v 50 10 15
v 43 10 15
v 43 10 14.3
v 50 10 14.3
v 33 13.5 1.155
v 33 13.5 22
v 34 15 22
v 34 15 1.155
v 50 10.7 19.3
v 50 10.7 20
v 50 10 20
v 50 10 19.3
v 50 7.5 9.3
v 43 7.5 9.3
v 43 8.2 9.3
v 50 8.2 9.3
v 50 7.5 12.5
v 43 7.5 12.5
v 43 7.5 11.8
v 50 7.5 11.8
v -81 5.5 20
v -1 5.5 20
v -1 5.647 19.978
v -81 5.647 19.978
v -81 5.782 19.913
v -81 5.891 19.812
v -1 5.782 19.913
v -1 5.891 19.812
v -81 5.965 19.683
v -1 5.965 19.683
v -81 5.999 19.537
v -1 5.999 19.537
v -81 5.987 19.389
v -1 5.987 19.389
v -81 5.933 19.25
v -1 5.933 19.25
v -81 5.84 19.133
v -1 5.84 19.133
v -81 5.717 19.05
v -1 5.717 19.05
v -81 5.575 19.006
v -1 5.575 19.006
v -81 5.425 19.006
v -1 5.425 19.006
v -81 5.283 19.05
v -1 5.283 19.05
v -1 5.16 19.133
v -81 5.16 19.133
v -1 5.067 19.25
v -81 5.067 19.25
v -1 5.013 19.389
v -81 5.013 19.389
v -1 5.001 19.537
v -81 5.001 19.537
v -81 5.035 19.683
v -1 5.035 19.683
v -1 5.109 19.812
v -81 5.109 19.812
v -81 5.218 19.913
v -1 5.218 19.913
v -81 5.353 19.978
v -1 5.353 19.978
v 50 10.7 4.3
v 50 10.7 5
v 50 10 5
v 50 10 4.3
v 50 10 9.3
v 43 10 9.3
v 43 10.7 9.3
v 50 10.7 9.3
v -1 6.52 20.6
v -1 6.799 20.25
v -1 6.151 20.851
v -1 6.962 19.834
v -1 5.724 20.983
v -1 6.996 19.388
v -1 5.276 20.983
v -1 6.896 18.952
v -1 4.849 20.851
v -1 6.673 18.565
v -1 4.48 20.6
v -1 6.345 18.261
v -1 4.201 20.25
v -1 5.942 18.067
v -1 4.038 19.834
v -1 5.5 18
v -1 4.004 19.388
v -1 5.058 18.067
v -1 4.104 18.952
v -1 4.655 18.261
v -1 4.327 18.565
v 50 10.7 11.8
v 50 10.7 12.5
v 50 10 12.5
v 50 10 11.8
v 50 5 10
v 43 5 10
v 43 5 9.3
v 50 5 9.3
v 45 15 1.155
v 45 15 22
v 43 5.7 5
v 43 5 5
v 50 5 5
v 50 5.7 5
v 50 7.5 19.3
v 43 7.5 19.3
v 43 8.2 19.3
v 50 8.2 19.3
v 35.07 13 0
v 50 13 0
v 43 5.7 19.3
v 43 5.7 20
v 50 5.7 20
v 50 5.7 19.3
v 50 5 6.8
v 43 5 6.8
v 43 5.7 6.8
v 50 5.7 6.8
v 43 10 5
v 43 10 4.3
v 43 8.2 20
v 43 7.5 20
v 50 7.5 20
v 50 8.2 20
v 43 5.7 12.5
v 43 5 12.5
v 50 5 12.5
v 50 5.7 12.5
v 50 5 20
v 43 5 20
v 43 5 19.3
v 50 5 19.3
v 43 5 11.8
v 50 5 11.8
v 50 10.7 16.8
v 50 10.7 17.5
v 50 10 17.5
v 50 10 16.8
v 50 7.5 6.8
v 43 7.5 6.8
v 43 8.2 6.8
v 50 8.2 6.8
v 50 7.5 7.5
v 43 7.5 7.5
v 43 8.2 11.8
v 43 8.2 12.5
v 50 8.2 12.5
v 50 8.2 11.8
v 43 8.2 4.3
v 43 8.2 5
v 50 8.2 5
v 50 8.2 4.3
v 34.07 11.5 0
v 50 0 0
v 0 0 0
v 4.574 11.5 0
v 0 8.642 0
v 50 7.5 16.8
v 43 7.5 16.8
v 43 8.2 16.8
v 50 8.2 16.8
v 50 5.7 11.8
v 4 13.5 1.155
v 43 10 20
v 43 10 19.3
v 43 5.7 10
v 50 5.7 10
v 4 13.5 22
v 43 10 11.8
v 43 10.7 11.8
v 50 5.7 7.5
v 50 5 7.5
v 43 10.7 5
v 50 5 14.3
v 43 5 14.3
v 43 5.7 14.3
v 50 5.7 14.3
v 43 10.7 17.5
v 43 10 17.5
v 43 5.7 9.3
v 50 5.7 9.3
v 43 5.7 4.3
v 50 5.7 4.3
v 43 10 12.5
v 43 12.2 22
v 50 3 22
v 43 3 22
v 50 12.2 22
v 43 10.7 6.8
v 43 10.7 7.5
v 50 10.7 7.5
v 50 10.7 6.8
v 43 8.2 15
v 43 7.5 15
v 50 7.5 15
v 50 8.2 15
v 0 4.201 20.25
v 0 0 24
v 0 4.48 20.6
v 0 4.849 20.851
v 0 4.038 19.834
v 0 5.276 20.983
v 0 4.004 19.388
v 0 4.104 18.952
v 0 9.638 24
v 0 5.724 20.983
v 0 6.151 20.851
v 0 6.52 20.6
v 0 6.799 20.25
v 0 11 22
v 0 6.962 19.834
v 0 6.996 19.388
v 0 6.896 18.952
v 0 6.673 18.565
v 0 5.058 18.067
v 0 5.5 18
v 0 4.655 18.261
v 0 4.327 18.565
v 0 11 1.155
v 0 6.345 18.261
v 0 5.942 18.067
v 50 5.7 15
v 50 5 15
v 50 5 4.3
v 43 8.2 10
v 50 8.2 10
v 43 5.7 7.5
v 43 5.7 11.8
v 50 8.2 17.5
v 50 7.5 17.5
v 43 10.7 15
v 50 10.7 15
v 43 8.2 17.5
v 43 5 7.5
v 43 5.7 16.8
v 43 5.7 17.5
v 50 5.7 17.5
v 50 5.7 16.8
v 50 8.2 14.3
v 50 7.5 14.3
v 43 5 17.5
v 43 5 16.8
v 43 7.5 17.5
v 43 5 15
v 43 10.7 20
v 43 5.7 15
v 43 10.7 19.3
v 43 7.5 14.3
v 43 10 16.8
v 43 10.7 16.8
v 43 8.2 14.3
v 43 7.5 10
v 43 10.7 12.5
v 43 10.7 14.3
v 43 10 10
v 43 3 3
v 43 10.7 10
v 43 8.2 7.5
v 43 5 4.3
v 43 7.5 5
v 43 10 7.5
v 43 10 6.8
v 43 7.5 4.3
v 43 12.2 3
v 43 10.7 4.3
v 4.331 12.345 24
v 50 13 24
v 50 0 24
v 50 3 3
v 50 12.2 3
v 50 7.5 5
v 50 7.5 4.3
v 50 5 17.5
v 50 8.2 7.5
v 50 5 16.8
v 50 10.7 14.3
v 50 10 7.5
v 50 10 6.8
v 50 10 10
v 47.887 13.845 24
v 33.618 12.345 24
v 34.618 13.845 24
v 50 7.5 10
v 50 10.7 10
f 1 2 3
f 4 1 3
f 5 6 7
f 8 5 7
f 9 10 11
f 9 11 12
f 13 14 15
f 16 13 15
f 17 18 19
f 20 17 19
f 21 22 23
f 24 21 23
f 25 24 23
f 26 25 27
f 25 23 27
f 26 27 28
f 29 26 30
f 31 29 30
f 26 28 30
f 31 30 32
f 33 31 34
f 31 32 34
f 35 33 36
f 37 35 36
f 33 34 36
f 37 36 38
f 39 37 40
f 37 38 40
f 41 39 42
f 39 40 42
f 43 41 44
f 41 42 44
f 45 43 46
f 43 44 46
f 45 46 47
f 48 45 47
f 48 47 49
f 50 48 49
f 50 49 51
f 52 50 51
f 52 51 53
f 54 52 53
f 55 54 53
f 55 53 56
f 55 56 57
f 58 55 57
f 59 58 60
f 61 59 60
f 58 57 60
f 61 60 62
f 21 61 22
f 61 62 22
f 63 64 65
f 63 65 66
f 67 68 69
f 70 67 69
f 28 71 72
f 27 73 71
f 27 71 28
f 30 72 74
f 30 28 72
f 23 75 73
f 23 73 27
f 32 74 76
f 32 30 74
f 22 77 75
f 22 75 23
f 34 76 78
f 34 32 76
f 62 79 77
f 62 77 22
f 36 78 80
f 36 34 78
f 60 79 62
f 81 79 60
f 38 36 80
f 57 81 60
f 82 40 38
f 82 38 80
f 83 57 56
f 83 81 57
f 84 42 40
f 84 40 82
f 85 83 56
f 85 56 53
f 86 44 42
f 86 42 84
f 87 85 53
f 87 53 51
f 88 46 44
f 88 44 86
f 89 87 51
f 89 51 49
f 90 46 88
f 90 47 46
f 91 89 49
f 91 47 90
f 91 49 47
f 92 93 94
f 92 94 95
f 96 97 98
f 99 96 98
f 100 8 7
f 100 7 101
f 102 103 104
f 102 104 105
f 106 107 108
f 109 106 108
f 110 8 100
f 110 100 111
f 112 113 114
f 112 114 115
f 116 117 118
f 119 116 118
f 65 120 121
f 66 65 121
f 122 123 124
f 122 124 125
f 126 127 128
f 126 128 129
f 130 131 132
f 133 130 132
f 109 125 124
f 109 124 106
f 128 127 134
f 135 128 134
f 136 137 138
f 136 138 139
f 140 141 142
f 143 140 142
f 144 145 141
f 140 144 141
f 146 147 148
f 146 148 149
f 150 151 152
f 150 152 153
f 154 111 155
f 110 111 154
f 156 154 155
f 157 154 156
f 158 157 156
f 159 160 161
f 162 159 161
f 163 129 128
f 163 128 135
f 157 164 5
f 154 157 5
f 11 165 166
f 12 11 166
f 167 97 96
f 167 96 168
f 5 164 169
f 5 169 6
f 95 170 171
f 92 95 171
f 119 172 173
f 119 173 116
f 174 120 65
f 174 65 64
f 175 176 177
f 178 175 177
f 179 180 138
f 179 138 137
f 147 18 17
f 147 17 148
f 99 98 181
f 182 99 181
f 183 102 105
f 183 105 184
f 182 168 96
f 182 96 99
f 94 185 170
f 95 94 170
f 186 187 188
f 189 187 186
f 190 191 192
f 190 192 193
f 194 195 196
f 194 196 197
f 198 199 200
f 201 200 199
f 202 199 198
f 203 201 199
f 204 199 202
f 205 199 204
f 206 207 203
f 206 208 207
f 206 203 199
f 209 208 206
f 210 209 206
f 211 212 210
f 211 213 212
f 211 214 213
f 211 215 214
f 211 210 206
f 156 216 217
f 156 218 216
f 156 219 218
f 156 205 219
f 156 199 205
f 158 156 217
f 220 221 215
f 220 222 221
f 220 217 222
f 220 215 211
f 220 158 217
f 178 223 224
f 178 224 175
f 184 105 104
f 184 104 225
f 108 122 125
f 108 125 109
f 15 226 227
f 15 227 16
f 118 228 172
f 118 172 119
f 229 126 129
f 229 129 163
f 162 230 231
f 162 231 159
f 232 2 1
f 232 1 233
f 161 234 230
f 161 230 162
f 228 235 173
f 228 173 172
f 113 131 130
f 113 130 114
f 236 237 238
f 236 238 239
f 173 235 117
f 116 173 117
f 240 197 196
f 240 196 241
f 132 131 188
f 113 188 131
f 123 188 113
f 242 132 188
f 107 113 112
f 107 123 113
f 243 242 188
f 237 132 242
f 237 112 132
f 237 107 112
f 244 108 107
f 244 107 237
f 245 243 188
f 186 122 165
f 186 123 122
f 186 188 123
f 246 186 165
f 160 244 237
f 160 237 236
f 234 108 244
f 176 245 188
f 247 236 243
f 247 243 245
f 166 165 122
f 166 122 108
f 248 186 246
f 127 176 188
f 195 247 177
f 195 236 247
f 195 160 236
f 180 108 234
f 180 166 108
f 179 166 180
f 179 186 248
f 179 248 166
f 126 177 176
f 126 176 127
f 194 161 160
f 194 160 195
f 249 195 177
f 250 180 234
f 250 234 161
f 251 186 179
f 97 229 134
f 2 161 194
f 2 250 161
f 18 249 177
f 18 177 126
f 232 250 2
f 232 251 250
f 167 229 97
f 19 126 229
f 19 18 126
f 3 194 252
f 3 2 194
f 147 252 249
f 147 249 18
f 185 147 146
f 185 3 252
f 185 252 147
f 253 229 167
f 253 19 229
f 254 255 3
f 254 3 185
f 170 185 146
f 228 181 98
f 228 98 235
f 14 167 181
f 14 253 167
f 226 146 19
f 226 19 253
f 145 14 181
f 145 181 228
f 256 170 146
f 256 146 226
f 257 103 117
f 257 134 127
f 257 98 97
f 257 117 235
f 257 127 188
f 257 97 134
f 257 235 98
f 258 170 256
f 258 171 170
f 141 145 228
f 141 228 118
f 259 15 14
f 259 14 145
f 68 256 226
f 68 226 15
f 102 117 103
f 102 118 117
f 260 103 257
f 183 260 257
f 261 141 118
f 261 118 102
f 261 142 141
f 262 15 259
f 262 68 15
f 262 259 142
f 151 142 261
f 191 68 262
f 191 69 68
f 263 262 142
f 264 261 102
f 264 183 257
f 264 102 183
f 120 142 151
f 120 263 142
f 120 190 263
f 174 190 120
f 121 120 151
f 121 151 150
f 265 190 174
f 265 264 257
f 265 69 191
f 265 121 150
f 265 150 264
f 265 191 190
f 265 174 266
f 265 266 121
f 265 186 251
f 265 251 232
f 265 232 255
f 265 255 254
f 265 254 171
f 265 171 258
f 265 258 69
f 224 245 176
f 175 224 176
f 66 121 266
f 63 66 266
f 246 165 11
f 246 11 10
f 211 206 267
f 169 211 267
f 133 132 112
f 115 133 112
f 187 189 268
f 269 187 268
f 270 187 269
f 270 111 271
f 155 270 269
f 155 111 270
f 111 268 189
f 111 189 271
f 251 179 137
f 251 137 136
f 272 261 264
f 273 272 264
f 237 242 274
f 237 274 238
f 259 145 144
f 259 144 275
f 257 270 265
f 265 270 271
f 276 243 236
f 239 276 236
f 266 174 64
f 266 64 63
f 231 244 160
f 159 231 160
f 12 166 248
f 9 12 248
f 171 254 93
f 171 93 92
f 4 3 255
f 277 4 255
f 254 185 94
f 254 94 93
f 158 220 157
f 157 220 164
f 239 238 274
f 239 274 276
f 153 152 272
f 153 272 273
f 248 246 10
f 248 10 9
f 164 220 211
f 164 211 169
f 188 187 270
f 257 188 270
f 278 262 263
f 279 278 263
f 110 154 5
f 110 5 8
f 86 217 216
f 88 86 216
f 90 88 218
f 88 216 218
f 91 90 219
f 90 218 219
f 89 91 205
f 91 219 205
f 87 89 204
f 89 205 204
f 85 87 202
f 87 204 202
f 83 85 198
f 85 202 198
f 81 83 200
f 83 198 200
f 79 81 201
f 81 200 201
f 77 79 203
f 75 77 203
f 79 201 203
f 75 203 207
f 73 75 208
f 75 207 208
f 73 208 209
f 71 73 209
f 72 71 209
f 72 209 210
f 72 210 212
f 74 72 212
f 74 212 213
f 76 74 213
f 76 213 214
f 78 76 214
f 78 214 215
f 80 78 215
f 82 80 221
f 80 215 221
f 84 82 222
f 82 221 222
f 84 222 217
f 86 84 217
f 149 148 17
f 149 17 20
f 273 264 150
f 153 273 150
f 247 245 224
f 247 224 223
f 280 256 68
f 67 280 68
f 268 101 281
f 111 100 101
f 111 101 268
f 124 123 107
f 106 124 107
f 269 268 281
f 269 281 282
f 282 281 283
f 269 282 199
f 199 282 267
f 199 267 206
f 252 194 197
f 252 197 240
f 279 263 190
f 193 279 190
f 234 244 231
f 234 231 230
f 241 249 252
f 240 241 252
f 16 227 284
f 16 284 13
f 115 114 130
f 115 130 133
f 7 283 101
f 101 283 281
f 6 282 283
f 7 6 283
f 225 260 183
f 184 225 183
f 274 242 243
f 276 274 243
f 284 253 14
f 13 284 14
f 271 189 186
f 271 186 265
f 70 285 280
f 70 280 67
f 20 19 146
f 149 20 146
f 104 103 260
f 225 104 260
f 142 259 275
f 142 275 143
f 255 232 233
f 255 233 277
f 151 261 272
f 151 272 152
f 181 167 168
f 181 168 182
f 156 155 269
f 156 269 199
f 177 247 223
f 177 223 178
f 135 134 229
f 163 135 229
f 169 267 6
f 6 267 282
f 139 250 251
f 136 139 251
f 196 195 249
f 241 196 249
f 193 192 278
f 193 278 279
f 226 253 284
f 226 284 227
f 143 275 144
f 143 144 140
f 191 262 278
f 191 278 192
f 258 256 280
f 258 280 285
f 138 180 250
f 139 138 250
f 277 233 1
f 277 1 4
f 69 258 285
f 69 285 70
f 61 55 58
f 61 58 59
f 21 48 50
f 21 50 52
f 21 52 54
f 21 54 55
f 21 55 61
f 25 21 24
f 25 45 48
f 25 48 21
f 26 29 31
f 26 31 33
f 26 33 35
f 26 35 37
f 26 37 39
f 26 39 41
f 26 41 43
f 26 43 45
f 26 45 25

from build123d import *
from OCP.BRepFilletAPI import BRepFilletAPI_MakeChamfer

# Parameters (mm, degrees)
BOSS_EXTRUDE1_DEPTH  = 24
SKETCH2_W            = 19
SKETCH2_H            = 9.2
CUT_EXTRUDE1_DEPTH   = 7
SKETCH3_W            = 0.7
SKETCH3_H            = 0.7
BOSS_EXTRUDE2_DEPTH  = 7
LPATTERN1_COUNT      = 7
LPATTERN1_PITCH      = 2.5
LPATTERN1_COUNT_DIR2 = 3
LPATTERN1_PITCH_DIR2 = 2.5
CHAMFER1_SIZE        = 2
CHAMFER1_SIZE2       = 1.154700538
SKETCH5_R            = 1.5
BOSS_EXTRUDE3_DEPTH  = 1
SKETCH6_R            = 0.5
BOSS_EXTRUDE4_DEPTH  = 80


with BuildPart() as part:
    # Sketch1 → Boss-Extrude1 (new body)
    with BuildSketch(Plane.XY):
        Polygon((0, 0), (0, 11), (4, 13.5), (33, 13.5), (34, 15), (45, 15), (50, 13), (50, 0), align=None)
    extrude(amount=BOSS_EXTRUDE1_DEPTH)

    # Sketch2 → Cut-Extrude1 (cut)
    with BuildSketch(Plane(origin=(50, 0, 0), x_dir=(0, 0, -1), z_dir=(1, 0, 0))):
        with Locations((-12.5, 7.6)):
            Rectangle(SKETCH2_W, SKETCH2_H)
    extrude(amount=-CUT_EXTRUDE1_DEPTH, mode=Mode.SUBTRACT)

    # Sketch3 → Boss-Extrude2 (add)
    with BuildSketch(Plane(origin=(43, 0, 0), x_dir=(0, 0, -1), z_dir=(1, 0, 0))):
        with Locations((-19.65, 5.35)):
            Rectangle(SKETCH3_W, SKETCH3_H)
    boss_extrude2 = extrude(amount=BOSS_EXTRUDE2_DEPTH)

    # LPattern1: Boss-Extrude2 7 × 3
    with Locations(*[(0, j * LPATTERN1_PITCH_DIR2, -i * LPATTERN1_PITCH) for i in range(LPATTERN1_COUNT) for j in range(LPATTERN1_COUNT_DIR2) if (i, j) != (0, 0)]):
        add(boss_extrude2)

    # Chamfer1: one chamfer whose edges measure the first distance from different faces: ONE call of the kernel's chamfer builder (chamfer() names one face for all edges)
    chamfer1_edges_1 = [part.edges().sort_by_distance(p)[0] for p in [
        (39.5, 15, 0),
        (33.5, 14.25, 0),
        (18.5, 13.5, 0),
        (2, 12.25, 0),
    ]]
    chamfer1_side_1 = [part.faces().sort_by_distance(p)[0] for p in [
        (25.603358705, 6.920985864, 0),
    ]]
    chamfer1_edges_2 = [part.edges().sort_by_distance(p)[0] for p in [
        (39.5, 15, 24),
    ]]
    chamfer1_side_2 = [part.faces().sort_by_distance(p)[0] for p in [
        (39.5, 15, 12),
    ]]
    chamfer1_edges_3 = [part.edges().sort_by_distance(p)[0] for p in [
        (33.5, 14.25, 24),
    ]]
    chamfer1_side_3 = [part.faces().sort_by_distance(p)[0] for p in [
        (33.5, 14.25, 12),
    ]]
    chamfer1_edges_4 = [part.edges().sort_by_distance(p)[0] for p in [
        (2, 12.25, 24),
    ]]
    chamfer1_side_4 = [part.faces().sort_by_distance(p)[0] for p in [
        (2, 12.25, 12),
    ]]
    chamfer1_edges_5 = [part.edges().sort_by_distance(p)[0] for p in [
        (18.5, 13.5, 24),
    ]]
    chamfer1_side_5 = [part.faces().sort_by_distance(p)[0] for p in [
        (18.5, 13.5, 12),
    ]]
    chamfer1 = BRepFilletAPI_MakeChamfer(part.part.solid().wrapped)
    for e in chamfer1_edges_1:
        chamfer1.Add(CHAMFER1_SIZE, CHAMFER1_SIZE2, e.wrapped, chamfer1_side_1[0].wrapped)  # the first distance lies on this face
    for e in chamfer1_edges_2:
        chamfer1.Add(CHAMFER1_SIZE, CHAMFER1_SIZE2, e.wrapped, chamfer1_side_2[0].wrapped)  # the first distance lies on this face
    for e in chamfer1_edges_3:
        chamfer1.Add(CHAMFER1_SIZE, CHAMFER1_SIZE2, e.wrapped, chamfer1_side_3[0].wrapped)  # the first distance lies on this face
    for e in chamfer1_edges_4:
        chamfer1.Add(CHAMFER1_SIZE, CHAMFER1_SIZE2, e.wrapped, chamfer1_side_4[0].wrapped)  # the first distance lies on this face
    for e in chamfer1_edges_5:
        chamfer1.Add(CHAMFER1_SIZE, CHAMFER1_SIZE2, e.wrapped, chamfer1_side_5[0].wrapped)  # the first distance lies on this face
    add(Compound.cast(chamfer1.Shape()), mode=Mode.REPLACE)

    # Sketch5 → Boss-Extrude3 (add)
    with BuildSketch(Plane.ZY):
        with Locations(Location((19.5, 5.5, 0), (0, 0, 180))):
            Circle(SKETCH5_R)
    extrude(amount=BOSS_EXTRUDE3_DEPTH)

    # Sketch6 → Boss-Extrude4 (add)
    with BuildSketch(Plane.ZY.offset(1)):
        with Locations((19.5, 5.5)):
            Circle(SKETCH6_R)
    extrude(amount=BOSS_EXTRUDE4_DEPTH)


solid = part.part
